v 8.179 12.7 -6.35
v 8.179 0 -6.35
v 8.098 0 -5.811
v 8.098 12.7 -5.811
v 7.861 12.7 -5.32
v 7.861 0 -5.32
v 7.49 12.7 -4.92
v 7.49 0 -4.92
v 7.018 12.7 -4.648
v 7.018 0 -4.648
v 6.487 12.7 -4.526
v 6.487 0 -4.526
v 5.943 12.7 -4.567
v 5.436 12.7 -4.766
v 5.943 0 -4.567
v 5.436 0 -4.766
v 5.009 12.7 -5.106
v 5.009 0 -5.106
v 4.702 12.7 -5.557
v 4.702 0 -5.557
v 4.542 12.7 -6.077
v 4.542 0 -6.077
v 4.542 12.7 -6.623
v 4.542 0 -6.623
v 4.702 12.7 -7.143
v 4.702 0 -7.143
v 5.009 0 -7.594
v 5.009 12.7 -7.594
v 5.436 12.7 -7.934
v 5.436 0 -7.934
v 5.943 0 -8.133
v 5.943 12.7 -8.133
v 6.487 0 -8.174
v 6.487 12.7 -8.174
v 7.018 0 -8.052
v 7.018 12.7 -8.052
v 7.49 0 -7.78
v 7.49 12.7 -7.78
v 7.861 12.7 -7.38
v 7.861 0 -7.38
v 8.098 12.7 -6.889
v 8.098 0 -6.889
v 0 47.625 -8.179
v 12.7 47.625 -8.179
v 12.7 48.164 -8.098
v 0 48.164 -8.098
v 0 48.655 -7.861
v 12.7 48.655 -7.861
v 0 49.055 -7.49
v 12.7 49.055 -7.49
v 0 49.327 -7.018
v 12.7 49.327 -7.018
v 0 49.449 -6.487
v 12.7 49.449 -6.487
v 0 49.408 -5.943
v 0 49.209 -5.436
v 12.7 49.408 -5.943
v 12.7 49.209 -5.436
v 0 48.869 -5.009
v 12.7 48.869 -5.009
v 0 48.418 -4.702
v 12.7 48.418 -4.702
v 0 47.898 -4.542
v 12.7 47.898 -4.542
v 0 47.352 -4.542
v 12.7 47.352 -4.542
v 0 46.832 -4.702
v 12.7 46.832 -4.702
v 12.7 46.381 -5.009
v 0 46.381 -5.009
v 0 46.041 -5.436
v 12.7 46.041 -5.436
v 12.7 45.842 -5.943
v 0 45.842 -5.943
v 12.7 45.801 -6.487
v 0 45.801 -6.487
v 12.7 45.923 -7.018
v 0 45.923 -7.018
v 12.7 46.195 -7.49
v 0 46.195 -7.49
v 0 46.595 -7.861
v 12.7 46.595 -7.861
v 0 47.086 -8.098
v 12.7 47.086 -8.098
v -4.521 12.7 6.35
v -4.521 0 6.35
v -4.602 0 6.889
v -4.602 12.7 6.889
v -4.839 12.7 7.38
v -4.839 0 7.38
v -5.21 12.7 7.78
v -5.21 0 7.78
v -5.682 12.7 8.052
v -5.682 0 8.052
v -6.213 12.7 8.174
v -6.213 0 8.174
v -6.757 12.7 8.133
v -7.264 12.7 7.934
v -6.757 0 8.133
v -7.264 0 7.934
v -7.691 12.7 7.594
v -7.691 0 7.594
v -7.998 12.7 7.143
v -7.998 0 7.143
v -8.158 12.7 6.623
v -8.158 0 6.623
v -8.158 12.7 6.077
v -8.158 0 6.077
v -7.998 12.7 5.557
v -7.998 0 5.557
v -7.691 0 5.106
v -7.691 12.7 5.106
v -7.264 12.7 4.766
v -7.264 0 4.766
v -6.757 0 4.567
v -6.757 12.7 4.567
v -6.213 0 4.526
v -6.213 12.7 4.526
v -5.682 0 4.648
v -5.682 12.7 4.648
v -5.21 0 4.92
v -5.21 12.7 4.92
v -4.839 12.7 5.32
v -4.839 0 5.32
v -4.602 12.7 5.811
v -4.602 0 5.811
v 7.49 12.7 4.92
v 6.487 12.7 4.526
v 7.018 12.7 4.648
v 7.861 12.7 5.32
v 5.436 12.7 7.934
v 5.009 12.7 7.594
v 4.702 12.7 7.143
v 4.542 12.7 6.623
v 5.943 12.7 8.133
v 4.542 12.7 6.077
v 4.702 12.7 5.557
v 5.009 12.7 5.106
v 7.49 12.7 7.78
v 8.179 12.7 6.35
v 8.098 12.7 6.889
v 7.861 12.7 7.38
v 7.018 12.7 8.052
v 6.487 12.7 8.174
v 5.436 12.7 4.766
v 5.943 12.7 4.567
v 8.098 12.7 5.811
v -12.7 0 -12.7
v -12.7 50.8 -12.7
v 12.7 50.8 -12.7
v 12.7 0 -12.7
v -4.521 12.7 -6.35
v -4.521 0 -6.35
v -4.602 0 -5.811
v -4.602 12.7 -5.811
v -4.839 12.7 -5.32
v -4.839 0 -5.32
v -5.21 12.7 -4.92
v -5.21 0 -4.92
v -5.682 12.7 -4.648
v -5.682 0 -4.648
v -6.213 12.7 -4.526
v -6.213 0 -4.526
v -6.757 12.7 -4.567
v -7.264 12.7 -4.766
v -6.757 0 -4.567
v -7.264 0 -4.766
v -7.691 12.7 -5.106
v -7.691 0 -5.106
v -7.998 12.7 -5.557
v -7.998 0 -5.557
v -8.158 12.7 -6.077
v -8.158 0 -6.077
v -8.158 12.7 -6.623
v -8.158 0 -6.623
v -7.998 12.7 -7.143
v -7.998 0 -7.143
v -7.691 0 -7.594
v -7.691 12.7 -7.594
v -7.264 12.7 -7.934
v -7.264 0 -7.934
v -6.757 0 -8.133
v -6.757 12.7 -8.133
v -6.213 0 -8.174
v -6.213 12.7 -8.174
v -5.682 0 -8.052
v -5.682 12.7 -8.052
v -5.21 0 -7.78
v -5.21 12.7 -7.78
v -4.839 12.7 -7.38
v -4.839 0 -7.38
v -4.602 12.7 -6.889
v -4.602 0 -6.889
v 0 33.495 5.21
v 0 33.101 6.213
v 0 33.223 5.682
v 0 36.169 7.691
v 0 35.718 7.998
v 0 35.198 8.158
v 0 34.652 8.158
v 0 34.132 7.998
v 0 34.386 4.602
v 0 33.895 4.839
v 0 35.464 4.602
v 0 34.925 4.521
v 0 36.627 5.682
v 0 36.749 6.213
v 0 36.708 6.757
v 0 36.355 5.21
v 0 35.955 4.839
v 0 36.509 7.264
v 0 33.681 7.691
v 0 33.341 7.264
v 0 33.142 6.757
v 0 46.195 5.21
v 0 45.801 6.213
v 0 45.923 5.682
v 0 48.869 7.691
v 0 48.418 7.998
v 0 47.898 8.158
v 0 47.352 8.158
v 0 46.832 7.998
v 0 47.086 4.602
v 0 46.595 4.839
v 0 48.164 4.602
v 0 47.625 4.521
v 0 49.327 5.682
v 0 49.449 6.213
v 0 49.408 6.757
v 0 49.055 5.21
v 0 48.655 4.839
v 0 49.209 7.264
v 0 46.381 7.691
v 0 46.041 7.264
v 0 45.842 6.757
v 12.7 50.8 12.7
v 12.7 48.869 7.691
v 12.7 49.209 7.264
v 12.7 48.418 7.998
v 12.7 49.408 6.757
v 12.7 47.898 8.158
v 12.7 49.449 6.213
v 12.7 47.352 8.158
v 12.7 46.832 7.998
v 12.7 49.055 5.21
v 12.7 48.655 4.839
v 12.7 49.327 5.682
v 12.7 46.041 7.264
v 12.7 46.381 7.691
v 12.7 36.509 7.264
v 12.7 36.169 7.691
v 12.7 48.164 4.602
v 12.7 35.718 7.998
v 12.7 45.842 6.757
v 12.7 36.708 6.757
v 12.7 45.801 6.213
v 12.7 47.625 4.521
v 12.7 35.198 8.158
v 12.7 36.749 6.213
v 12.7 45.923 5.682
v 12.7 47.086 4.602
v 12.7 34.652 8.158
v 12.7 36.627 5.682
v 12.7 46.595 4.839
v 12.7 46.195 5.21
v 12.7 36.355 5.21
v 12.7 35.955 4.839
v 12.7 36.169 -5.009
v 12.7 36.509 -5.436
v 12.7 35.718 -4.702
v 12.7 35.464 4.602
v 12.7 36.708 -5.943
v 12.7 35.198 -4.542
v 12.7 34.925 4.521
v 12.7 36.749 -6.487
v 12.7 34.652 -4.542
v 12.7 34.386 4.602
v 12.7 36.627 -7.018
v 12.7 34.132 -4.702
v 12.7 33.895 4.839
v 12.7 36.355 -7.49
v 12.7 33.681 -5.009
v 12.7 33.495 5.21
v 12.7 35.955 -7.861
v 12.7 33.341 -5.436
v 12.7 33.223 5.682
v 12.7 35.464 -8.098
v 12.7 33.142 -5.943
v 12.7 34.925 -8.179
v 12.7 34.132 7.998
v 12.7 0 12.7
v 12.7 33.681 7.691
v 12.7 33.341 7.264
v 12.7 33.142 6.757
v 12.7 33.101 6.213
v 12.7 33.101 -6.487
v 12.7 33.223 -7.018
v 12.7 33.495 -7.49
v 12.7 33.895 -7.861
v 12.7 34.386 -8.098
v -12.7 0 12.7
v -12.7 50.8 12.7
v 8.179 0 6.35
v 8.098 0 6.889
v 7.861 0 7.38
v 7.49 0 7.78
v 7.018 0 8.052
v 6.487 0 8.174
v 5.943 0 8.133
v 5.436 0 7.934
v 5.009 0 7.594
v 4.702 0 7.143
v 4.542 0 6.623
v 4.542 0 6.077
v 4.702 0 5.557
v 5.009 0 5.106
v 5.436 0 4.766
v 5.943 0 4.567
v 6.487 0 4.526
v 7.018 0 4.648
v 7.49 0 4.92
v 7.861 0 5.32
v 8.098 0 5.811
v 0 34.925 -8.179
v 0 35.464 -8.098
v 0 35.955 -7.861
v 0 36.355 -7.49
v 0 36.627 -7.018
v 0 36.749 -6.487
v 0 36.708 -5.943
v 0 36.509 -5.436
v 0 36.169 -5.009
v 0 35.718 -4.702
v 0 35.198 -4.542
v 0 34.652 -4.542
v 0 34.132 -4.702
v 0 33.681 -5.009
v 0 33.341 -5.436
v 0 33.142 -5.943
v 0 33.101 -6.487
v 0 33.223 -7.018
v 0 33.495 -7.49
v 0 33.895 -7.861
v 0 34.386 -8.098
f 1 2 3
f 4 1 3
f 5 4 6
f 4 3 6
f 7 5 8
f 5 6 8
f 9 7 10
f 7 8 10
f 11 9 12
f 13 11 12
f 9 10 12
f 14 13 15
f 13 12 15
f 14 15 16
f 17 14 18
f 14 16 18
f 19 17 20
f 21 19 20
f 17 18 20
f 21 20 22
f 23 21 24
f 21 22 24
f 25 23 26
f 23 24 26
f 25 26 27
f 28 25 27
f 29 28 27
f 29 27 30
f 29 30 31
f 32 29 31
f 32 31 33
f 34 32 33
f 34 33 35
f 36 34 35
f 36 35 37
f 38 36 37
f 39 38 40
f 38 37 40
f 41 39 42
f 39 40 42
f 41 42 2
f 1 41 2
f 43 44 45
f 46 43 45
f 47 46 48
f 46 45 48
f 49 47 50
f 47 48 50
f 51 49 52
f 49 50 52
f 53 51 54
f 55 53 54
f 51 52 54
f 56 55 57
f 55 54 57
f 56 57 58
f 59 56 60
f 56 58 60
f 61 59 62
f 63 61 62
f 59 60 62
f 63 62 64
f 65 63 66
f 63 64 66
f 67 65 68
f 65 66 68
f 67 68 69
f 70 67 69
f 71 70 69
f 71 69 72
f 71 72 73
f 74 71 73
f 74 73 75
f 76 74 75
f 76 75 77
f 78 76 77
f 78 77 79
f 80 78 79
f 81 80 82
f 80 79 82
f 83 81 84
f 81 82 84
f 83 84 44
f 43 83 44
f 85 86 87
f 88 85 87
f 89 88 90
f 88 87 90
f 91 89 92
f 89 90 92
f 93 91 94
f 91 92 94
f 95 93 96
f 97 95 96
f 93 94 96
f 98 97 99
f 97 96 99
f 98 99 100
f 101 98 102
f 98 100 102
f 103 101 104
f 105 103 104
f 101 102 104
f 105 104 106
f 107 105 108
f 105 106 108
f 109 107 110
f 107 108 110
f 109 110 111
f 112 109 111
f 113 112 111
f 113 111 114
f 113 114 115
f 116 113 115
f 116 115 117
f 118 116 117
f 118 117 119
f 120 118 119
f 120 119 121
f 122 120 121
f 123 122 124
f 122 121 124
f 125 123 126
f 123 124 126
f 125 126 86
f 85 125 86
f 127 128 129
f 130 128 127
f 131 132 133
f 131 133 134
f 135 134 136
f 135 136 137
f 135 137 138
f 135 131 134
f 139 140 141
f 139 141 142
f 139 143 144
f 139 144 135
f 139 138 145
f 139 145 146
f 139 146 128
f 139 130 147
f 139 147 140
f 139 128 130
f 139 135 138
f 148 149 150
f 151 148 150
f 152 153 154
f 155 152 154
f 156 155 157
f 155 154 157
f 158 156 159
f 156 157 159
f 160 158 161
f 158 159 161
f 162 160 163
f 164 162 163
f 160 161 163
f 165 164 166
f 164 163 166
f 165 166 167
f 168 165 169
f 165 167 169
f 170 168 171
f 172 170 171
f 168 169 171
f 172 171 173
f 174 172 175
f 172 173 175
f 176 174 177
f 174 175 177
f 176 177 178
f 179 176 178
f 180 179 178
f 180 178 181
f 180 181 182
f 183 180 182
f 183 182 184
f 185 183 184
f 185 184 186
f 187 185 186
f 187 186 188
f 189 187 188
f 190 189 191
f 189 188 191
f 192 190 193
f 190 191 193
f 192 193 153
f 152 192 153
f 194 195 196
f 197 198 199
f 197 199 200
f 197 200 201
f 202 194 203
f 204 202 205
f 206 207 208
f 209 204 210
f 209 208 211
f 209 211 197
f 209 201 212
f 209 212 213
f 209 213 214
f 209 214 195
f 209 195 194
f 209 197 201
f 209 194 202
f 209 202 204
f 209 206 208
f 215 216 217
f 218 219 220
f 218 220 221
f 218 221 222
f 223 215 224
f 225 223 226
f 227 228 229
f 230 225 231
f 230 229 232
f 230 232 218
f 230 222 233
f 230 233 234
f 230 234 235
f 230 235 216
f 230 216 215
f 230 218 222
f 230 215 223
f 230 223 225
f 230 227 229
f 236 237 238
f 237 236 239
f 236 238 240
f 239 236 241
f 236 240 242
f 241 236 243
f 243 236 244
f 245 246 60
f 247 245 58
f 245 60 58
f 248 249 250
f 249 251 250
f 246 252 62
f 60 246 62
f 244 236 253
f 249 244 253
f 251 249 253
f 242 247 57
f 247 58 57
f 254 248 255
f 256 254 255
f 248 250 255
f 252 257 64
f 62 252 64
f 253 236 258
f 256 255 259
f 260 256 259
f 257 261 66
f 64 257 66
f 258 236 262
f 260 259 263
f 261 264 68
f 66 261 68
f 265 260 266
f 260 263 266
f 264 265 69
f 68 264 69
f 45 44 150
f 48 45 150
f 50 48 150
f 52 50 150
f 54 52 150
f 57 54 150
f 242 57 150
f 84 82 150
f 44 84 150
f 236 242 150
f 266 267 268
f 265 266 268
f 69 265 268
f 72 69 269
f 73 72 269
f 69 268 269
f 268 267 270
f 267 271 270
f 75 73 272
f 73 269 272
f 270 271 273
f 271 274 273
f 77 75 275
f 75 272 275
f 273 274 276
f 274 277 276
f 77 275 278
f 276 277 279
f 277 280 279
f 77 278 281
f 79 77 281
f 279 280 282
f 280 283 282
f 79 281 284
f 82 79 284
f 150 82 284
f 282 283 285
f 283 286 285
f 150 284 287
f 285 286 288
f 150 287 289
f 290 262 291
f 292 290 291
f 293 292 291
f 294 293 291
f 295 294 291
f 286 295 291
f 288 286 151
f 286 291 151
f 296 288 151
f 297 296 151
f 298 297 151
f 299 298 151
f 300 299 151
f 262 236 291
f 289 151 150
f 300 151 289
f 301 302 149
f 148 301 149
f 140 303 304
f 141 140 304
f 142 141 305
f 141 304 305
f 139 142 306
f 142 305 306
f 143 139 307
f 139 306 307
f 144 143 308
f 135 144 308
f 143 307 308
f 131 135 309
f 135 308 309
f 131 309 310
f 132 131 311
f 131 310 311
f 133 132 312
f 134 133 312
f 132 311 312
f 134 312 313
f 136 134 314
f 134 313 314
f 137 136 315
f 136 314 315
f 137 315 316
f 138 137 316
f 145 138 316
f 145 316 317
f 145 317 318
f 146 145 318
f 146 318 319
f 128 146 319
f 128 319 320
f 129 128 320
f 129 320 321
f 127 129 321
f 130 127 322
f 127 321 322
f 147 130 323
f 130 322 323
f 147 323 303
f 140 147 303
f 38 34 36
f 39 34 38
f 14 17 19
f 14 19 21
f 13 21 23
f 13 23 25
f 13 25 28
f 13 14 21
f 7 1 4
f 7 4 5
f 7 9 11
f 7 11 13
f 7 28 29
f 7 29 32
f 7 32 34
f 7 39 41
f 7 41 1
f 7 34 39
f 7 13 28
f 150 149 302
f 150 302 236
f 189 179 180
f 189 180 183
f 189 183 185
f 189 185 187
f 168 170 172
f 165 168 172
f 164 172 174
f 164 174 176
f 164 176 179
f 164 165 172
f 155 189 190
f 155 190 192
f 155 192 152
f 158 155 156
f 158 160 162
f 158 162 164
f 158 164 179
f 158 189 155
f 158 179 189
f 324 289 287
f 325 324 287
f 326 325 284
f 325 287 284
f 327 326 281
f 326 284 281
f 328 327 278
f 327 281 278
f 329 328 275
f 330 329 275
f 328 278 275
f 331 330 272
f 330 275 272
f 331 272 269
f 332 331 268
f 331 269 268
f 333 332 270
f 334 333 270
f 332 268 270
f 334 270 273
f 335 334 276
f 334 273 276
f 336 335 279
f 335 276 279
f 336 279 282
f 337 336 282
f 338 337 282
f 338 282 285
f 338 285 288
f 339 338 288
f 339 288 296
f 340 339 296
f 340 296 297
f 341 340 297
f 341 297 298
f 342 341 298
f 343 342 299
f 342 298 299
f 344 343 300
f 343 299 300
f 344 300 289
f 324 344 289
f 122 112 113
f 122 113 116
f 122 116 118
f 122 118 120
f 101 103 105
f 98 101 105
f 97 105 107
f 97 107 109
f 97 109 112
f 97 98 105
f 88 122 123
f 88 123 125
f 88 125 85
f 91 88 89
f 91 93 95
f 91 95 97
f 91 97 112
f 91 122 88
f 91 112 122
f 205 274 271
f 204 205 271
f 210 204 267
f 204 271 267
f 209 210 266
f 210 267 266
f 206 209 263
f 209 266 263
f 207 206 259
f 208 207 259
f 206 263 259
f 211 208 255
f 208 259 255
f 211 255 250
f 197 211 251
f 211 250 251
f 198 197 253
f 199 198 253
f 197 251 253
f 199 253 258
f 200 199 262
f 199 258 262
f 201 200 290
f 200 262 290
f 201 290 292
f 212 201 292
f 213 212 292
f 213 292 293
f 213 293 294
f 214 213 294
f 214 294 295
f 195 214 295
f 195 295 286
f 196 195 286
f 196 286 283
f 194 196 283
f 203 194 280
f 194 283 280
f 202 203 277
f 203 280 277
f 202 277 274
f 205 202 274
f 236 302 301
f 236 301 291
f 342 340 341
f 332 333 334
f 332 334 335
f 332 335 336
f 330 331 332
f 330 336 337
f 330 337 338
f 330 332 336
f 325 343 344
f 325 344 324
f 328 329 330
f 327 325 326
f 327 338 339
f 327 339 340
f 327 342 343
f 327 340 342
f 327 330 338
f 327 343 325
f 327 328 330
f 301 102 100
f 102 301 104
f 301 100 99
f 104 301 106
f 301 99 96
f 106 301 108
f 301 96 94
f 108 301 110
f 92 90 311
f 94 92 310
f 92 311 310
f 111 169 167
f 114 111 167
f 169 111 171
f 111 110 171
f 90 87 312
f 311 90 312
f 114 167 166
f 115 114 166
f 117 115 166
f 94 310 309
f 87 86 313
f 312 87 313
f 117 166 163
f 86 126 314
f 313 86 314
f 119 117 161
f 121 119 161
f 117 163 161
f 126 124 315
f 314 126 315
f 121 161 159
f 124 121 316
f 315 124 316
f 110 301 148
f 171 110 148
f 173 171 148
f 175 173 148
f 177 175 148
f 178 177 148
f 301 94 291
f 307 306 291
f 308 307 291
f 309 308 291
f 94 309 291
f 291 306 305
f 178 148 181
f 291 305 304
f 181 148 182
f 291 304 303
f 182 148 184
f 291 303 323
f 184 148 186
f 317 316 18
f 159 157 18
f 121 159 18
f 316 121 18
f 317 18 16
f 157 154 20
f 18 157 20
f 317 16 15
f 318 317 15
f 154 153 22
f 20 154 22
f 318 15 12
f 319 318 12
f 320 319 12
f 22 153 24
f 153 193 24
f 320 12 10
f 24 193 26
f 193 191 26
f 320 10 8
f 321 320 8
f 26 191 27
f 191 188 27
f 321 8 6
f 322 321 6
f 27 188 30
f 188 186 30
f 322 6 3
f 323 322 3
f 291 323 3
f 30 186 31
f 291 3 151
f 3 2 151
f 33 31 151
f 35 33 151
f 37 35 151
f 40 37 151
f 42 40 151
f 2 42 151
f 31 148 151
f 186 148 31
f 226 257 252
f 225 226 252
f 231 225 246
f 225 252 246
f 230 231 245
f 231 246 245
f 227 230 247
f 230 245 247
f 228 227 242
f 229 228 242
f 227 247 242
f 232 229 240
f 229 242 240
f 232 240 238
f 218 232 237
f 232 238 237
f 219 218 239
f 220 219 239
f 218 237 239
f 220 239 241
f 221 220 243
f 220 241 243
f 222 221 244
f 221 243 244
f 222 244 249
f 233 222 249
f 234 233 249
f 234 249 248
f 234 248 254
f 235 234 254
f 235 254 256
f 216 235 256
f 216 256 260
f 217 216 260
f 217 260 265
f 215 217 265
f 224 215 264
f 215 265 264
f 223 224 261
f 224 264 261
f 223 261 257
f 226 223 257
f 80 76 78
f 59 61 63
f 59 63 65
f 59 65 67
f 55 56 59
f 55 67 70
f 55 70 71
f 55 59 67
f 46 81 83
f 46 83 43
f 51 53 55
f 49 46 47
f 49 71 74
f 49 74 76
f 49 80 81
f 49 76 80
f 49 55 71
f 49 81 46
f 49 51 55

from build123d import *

# Parameters (mm, degrees)
SKETCH1_W           = 25.4
SKETCH1_H           = 25.4
BOSS_EXTRUDE1_DEPTH = 50.8
SKETCH2_R           = 1.8288
CUT_EXTRUDE1_DEPTH  = 12.7
SKETCH3_R           = 1.8288
CUT_EXTRUDE2_DEPTH  = 12.7


with BuildPart() as part:
    # Sketch1 → Boss-Extrude1 (new body)
    with BuildSketch(Plane(origin=(0, 0, 0), x_dir=(1, 0, 0), z_dir=(0, 1, 0))):
        Rectangle(SKETCH1_W, SKETCH1_H)
    extrude(amount=BOSS_EXTRUDE1_DEPTH)

    # Sketch2 → Cut-Extrude1 (cut)
    with BuildSketch(Plane(origin=(12.7, 0, 0), x_dir=(0, 0, -1), z_dir=(1, 0, 0))):
        with Locations((-6.35, 47.625)):
            Circle(SKETCH2_R)
        with Locations((6.35, 47.625)):
            Circle(SKETCH2_R)
        with Locations((6.35, 34.925)):
            Circle(SKETCH2_R)
        with Locations((-6.35, 34.925)):
            Circle(SKETCH2_R)
    extrude(amount=-CUT_EXTRUDE1_DEPTH, mode=Mode.SUBTRACT)

    # Sketch3 → Cut-Extrude2 (cut)
    with BuildSketch(Plane.XZ):
        with Locations((-6.35, 6.35)):
            Circle(SKETCH3_R)
        with Locations((6.35, 6.35)):
            Circle(SKETCH3_R)
        with Locations((6.35, -6.35)):
            Circle(SKETCH3_R)
        with Locations((-6.35, -6.35)):
            Circle(SKETCH3_R)
    extrude(amount=-CUT_EXTRUDE2_DEPTH, mode=Mode.SUBTRACT)


solid = part.part
